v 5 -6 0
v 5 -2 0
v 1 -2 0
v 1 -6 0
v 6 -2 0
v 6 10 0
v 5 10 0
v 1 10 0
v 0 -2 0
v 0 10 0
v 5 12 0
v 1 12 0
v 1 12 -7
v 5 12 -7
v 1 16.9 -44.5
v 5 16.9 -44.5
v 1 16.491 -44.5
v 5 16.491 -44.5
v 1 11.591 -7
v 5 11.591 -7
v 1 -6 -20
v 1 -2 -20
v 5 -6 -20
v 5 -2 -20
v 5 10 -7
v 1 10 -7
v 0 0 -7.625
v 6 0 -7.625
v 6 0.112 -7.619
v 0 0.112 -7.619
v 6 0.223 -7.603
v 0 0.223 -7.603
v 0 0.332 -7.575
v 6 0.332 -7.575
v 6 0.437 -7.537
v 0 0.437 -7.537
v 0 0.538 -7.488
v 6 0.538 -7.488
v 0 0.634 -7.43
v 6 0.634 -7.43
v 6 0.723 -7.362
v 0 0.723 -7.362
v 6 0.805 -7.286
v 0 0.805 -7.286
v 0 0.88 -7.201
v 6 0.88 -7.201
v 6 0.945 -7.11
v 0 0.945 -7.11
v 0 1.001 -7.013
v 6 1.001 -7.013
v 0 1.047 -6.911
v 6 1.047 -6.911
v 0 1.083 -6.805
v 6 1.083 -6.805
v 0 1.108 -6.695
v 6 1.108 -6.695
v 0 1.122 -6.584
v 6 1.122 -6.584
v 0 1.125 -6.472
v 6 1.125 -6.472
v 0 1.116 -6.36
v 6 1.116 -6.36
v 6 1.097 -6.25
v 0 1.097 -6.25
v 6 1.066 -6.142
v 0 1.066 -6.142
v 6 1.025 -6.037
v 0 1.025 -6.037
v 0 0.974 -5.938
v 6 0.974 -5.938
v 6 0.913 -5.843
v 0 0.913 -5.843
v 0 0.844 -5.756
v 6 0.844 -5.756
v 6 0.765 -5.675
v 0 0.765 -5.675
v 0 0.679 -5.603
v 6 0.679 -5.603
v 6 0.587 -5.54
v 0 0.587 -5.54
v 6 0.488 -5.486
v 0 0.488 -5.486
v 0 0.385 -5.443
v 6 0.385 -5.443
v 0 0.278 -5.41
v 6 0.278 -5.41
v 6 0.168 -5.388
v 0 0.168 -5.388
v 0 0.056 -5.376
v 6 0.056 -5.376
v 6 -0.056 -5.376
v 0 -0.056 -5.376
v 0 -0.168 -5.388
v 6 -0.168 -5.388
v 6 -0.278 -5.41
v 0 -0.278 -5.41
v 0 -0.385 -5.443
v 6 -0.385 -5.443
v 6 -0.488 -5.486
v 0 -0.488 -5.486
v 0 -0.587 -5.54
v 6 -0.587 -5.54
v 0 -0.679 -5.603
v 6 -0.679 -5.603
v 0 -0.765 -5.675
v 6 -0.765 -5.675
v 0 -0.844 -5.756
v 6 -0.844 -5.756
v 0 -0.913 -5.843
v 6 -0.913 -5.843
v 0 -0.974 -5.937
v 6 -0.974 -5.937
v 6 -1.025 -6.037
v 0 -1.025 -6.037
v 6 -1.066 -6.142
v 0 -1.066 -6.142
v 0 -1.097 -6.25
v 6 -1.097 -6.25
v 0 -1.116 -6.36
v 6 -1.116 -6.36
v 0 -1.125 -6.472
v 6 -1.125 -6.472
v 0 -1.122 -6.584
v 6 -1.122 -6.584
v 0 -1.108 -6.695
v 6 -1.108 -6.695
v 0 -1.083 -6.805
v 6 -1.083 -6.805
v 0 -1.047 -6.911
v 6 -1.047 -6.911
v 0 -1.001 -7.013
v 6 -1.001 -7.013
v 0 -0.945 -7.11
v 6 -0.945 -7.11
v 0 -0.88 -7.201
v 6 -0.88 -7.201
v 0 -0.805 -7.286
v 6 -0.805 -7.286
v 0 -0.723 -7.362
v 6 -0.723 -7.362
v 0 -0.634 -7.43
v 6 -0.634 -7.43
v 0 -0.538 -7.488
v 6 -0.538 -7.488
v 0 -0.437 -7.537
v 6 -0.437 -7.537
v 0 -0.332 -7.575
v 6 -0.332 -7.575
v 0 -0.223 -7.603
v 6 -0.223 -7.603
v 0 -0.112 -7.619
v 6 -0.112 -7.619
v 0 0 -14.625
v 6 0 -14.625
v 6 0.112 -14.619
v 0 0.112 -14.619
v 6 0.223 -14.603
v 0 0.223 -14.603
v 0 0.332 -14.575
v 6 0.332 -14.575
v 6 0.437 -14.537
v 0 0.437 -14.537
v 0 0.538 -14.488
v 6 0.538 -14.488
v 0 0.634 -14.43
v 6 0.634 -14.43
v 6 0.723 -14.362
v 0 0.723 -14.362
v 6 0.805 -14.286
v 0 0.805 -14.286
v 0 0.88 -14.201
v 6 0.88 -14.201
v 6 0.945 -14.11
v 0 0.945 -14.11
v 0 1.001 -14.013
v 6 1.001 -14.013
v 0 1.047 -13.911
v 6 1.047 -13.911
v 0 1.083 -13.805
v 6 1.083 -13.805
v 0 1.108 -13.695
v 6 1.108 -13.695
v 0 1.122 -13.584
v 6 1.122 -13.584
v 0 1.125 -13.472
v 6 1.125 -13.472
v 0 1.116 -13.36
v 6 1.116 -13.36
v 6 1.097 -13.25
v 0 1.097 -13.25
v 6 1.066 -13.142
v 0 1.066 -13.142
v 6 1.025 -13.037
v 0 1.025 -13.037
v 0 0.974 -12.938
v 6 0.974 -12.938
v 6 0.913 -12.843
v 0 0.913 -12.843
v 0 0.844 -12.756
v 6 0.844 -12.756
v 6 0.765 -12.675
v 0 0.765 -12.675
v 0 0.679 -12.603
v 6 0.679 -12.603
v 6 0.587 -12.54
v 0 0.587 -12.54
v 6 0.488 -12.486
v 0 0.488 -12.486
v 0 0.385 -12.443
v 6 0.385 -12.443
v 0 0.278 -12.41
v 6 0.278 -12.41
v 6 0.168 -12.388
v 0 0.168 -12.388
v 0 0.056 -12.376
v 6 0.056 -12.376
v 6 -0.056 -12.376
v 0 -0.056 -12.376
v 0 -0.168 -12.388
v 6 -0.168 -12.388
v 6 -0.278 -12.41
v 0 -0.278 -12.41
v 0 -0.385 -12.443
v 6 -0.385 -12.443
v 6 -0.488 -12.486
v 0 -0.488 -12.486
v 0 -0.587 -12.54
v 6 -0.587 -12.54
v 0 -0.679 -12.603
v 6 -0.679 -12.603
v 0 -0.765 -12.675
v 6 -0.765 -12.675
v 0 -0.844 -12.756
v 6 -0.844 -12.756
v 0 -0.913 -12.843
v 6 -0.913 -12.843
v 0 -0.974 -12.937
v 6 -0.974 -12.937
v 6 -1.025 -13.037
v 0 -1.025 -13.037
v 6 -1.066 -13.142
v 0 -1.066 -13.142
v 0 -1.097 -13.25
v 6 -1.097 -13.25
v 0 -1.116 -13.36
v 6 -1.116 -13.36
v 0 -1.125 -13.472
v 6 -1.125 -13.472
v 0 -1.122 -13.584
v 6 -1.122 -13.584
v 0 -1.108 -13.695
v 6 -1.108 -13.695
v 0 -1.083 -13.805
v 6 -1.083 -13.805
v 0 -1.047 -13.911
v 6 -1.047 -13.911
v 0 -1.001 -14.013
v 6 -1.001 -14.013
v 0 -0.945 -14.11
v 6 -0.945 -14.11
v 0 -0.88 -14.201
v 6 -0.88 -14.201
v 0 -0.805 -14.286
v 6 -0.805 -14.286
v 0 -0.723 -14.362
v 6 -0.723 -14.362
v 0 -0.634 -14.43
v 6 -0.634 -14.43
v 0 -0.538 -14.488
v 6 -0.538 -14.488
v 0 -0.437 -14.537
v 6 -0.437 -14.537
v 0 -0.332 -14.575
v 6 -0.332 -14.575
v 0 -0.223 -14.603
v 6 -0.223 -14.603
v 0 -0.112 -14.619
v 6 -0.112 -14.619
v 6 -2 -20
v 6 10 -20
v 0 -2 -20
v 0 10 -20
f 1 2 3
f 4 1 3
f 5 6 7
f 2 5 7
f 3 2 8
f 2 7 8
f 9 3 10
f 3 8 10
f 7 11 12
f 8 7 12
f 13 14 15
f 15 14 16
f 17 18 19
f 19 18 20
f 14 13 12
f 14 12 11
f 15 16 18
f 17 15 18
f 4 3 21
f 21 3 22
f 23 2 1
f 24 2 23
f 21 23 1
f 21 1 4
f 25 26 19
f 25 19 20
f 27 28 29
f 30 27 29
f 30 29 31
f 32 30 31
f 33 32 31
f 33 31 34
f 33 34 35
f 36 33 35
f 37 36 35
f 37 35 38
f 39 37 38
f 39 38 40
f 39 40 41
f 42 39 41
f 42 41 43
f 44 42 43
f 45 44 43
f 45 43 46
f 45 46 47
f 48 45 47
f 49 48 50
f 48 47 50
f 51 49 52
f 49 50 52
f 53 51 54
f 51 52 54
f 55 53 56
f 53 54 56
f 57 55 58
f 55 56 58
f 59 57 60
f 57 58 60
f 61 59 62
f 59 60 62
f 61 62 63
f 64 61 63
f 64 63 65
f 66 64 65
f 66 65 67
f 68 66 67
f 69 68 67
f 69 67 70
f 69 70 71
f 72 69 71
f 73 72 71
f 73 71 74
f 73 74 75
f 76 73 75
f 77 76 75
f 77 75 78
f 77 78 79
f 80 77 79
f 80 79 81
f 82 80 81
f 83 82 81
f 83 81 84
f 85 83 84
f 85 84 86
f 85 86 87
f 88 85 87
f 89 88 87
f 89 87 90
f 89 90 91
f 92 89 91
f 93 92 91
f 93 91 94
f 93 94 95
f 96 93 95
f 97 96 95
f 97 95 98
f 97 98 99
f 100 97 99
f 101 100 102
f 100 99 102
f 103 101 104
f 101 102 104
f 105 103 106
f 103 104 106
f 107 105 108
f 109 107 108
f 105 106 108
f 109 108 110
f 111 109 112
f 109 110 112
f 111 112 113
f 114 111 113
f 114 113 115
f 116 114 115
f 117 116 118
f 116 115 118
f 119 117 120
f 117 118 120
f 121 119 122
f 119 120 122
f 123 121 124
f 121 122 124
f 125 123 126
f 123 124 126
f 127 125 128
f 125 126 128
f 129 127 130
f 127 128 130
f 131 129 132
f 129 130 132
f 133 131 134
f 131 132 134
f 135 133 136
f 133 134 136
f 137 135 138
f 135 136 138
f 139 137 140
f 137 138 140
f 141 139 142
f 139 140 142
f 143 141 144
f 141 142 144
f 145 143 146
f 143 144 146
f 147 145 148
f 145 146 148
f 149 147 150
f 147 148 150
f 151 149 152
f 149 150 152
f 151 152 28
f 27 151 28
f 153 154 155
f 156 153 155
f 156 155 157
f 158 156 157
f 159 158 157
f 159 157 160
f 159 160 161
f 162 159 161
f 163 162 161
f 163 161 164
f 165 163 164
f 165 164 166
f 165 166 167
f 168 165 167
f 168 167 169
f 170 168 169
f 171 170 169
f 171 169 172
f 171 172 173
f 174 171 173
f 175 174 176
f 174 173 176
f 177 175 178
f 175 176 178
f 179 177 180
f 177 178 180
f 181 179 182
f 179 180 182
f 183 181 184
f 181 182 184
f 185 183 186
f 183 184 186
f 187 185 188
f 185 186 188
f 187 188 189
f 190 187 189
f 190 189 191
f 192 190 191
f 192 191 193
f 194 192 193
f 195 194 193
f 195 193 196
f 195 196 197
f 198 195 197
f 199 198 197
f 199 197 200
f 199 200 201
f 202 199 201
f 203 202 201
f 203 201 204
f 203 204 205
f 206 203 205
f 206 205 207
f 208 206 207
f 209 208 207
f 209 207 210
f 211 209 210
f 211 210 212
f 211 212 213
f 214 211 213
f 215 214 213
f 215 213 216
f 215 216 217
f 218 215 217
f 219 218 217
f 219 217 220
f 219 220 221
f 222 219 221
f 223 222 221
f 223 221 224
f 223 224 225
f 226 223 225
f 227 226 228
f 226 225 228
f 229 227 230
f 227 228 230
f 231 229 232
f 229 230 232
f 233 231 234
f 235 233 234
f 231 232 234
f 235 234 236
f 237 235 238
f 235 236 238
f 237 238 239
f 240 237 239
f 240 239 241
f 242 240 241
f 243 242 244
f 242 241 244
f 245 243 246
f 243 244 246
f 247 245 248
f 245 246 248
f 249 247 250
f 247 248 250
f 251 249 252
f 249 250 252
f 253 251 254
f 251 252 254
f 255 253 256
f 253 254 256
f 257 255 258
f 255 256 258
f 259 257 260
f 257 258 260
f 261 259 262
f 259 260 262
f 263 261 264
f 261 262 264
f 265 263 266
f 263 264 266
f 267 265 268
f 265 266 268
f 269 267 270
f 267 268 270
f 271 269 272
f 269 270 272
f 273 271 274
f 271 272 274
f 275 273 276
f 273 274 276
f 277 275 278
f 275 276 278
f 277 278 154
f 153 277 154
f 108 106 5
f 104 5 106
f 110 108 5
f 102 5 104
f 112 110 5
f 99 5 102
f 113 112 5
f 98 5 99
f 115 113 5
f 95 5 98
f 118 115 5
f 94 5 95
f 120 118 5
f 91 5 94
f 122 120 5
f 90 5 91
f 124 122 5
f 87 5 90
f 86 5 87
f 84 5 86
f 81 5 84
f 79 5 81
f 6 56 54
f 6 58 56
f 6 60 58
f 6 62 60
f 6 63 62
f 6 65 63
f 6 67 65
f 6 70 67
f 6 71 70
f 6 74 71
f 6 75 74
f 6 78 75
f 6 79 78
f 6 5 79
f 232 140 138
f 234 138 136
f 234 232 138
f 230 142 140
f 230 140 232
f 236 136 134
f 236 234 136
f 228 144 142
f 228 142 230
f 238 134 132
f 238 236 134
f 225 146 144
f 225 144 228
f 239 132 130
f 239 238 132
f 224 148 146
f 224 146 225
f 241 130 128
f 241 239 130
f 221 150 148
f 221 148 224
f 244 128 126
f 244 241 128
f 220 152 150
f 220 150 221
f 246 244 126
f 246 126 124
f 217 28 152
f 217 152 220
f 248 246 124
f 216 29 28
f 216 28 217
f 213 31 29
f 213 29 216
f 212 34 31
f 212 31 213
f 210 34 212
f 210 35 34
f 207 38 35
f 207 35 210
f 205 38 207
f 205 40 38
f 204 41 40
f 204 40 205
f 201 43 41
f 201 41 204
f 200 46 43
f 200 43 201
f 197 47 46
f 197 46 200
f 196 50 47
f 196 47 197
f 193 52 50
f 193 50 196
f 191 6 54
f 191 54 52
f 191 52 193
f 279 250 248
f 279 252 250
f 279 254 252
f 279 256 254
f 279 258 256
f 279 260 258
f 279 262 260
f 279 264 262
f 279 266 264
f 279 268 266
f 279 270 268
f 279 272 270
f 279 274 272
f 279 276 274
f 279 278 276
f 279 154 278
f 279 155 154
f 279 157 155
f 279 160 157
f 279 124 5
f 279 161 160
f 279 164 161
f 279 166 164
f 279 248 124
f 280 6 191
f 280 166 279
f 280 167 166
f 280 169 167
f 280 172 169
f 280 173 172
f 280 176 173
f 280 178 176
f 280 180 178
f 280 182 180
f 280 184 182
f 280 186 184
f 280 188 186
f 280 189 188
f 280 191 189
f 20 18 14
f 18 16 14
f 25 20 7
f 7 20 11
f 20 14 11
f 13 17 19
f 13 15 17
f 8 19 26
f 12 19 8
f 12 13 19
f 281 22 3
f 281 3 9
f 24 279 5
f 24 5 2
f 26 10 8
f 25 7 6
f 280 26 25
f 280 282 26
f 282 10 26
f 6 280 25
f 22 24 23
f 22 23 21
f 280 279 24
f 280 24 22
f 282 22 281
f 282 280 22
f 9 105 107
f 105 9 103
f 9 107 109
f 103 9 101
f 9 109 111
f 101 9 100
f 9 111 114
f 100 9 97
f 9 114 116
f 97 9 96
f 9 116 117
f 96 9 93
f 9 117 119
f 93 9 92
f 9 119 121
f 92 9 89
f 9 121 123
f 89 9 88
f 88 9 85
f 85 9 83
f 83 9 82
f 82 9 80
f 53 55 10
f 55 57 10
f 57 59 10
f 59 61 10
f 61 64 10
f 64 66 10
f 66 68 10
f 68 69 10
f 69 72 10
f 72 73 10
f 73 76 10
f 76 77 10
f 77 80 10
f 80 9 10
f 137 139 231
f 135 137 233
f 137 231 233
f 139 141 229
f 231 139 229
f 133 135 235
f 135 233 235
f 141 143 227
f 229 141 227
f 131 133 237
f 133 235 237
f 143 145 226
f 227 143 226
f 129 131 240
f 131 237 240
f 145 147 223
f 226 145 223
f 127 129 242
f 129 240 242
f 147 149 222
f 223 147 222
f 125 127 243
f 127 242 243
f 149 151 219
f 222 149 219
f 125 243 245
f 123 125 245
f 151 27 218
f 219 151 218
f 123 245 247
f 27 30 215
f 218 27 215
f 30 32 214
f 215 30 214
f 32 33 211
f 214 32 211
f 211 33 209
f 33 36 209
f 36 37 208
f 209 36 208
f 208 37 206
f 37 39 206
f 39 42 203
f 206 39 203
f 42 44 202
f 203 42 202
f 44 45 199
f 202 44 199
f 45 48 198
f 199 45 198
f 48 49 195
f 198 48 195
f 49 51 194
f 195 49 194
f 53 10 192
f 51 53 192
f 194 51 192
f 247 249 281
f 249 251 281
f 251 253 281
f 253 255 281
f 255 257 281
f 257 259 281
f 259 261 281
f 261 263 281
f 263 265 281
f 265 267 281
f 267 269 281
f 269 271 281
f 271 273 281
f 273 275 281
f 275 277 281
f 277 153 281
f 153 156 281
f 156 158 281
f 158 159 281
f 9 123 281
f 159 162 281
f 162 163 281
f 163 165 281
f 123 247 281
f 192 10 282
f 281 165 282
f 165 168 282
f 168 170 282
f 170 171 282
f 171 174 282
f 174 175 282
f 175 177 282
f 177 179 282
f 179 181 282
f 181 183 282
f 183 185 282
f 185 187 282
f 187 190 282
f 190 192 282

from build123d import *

# Parameters (mm, degrees)
SKETCH1_W           = 6
SKETCH1_H           = 20
BOSS_EXTRUDE1_DEPTH = 10
SKETCH3_W           = 6
SKETCH3_H           = 20
BOSS_EXTRUDE2_DEPTH = 2
SKETCH2_R           = 1.125
CUT_EXTRUDE1_DEPTH  = 7
SKETCH4_W           = 4
SKETCH4_H           = 20
BOSS_EXTRUDE3_DEPTH = 4
SKETCH5_W           = 4
SKETCH5_H           = 7
BOSS_EXTRUDE4_DEPTH = 2
BOSS_EXTRUDE5_DEPTH = 4


with BuildPart() as part:
    # Sketch1 → Boss-Extrude1 (new body)
    with BuildSketch(Plane(origin=(0, 0, 0), x_dir=(1, 0, 0), z_dir=(0, 1, 0))):
        with Locations((3, 10)):
            Rectangle(SKETCH1_W, SKETCH1_H)
    extrude(amount=BOSS_EXTRUDE1_DEPTH)

    # Sketch3 → Boss-Extrude2 (add)
    with BuildSketch(Plane(origin=(0, 0, 0), x_dir=(-1, 0, 0), z_dir=(0, -1, 0))):
        with Locations((-3, 10)):
            Rectangle(SKETCH3_W, SKETCH3_H)
    extrude(amount=BOSS_EXTRUDE2_DEPTH)

    # Sketch2 → Cut-Extrude1 (cut)
    with BuildSketch(Plane(origin=(6, 0, 0), x_dir=(0, 0, -1), z_dir=(1, 0, 0))):
        with Locations((6.5, 0)):
            Circle(SKETCH2_R)
        with Locations((13.5, 0)):
            Circle(SKETCH2_R)
    extrude(amount=-CUT_EXTRUDE1_DEPTH, mode=Mode.SUBTRACT)

    # Sketch4 → Boss-Extrude3 (add)
    with BuildSketch(Plane(origin=(0, -2, 0), x_dir=(-1, 0, 0), z_dir=(0, -1, 0))):
        with Locations((-3, 10)):
            Rectangle(SKETCH4_W, SKETCH4_H)
    extrude(amount=BOSS_EXTRUDE3_DEPTH)

    # Sketch5 → Boss-Extrude4 (add)
    with BuildSketch(Plane(origin=(0, 10, 0), x_dir=(1, 0, 0), z_dir=(0, 1, 0))):
        with Locations((3, 3.5)):
            Rectangle(SKETCH5_W, SKETCH5_H)
    extrude(amount=BOSS_EXTRUDE4_DEPTH)

    # Sketch7 → Boss-Extrude5 (add)
    with BuildSketch(Plane(origin=(5, 0, 0), x_dir=(0, 0, -1), z_dir=(1, 0, 0))):
        Polygon((7, 12), (44.5, 16.9), (44.5, 16.491160733), (7, 11.591160733), (7, 10), (0, 10), (0, 12), align=None)
    extrude(amount=-BOSS_EXTRUDE5_DEPTH)


solid = part.part
